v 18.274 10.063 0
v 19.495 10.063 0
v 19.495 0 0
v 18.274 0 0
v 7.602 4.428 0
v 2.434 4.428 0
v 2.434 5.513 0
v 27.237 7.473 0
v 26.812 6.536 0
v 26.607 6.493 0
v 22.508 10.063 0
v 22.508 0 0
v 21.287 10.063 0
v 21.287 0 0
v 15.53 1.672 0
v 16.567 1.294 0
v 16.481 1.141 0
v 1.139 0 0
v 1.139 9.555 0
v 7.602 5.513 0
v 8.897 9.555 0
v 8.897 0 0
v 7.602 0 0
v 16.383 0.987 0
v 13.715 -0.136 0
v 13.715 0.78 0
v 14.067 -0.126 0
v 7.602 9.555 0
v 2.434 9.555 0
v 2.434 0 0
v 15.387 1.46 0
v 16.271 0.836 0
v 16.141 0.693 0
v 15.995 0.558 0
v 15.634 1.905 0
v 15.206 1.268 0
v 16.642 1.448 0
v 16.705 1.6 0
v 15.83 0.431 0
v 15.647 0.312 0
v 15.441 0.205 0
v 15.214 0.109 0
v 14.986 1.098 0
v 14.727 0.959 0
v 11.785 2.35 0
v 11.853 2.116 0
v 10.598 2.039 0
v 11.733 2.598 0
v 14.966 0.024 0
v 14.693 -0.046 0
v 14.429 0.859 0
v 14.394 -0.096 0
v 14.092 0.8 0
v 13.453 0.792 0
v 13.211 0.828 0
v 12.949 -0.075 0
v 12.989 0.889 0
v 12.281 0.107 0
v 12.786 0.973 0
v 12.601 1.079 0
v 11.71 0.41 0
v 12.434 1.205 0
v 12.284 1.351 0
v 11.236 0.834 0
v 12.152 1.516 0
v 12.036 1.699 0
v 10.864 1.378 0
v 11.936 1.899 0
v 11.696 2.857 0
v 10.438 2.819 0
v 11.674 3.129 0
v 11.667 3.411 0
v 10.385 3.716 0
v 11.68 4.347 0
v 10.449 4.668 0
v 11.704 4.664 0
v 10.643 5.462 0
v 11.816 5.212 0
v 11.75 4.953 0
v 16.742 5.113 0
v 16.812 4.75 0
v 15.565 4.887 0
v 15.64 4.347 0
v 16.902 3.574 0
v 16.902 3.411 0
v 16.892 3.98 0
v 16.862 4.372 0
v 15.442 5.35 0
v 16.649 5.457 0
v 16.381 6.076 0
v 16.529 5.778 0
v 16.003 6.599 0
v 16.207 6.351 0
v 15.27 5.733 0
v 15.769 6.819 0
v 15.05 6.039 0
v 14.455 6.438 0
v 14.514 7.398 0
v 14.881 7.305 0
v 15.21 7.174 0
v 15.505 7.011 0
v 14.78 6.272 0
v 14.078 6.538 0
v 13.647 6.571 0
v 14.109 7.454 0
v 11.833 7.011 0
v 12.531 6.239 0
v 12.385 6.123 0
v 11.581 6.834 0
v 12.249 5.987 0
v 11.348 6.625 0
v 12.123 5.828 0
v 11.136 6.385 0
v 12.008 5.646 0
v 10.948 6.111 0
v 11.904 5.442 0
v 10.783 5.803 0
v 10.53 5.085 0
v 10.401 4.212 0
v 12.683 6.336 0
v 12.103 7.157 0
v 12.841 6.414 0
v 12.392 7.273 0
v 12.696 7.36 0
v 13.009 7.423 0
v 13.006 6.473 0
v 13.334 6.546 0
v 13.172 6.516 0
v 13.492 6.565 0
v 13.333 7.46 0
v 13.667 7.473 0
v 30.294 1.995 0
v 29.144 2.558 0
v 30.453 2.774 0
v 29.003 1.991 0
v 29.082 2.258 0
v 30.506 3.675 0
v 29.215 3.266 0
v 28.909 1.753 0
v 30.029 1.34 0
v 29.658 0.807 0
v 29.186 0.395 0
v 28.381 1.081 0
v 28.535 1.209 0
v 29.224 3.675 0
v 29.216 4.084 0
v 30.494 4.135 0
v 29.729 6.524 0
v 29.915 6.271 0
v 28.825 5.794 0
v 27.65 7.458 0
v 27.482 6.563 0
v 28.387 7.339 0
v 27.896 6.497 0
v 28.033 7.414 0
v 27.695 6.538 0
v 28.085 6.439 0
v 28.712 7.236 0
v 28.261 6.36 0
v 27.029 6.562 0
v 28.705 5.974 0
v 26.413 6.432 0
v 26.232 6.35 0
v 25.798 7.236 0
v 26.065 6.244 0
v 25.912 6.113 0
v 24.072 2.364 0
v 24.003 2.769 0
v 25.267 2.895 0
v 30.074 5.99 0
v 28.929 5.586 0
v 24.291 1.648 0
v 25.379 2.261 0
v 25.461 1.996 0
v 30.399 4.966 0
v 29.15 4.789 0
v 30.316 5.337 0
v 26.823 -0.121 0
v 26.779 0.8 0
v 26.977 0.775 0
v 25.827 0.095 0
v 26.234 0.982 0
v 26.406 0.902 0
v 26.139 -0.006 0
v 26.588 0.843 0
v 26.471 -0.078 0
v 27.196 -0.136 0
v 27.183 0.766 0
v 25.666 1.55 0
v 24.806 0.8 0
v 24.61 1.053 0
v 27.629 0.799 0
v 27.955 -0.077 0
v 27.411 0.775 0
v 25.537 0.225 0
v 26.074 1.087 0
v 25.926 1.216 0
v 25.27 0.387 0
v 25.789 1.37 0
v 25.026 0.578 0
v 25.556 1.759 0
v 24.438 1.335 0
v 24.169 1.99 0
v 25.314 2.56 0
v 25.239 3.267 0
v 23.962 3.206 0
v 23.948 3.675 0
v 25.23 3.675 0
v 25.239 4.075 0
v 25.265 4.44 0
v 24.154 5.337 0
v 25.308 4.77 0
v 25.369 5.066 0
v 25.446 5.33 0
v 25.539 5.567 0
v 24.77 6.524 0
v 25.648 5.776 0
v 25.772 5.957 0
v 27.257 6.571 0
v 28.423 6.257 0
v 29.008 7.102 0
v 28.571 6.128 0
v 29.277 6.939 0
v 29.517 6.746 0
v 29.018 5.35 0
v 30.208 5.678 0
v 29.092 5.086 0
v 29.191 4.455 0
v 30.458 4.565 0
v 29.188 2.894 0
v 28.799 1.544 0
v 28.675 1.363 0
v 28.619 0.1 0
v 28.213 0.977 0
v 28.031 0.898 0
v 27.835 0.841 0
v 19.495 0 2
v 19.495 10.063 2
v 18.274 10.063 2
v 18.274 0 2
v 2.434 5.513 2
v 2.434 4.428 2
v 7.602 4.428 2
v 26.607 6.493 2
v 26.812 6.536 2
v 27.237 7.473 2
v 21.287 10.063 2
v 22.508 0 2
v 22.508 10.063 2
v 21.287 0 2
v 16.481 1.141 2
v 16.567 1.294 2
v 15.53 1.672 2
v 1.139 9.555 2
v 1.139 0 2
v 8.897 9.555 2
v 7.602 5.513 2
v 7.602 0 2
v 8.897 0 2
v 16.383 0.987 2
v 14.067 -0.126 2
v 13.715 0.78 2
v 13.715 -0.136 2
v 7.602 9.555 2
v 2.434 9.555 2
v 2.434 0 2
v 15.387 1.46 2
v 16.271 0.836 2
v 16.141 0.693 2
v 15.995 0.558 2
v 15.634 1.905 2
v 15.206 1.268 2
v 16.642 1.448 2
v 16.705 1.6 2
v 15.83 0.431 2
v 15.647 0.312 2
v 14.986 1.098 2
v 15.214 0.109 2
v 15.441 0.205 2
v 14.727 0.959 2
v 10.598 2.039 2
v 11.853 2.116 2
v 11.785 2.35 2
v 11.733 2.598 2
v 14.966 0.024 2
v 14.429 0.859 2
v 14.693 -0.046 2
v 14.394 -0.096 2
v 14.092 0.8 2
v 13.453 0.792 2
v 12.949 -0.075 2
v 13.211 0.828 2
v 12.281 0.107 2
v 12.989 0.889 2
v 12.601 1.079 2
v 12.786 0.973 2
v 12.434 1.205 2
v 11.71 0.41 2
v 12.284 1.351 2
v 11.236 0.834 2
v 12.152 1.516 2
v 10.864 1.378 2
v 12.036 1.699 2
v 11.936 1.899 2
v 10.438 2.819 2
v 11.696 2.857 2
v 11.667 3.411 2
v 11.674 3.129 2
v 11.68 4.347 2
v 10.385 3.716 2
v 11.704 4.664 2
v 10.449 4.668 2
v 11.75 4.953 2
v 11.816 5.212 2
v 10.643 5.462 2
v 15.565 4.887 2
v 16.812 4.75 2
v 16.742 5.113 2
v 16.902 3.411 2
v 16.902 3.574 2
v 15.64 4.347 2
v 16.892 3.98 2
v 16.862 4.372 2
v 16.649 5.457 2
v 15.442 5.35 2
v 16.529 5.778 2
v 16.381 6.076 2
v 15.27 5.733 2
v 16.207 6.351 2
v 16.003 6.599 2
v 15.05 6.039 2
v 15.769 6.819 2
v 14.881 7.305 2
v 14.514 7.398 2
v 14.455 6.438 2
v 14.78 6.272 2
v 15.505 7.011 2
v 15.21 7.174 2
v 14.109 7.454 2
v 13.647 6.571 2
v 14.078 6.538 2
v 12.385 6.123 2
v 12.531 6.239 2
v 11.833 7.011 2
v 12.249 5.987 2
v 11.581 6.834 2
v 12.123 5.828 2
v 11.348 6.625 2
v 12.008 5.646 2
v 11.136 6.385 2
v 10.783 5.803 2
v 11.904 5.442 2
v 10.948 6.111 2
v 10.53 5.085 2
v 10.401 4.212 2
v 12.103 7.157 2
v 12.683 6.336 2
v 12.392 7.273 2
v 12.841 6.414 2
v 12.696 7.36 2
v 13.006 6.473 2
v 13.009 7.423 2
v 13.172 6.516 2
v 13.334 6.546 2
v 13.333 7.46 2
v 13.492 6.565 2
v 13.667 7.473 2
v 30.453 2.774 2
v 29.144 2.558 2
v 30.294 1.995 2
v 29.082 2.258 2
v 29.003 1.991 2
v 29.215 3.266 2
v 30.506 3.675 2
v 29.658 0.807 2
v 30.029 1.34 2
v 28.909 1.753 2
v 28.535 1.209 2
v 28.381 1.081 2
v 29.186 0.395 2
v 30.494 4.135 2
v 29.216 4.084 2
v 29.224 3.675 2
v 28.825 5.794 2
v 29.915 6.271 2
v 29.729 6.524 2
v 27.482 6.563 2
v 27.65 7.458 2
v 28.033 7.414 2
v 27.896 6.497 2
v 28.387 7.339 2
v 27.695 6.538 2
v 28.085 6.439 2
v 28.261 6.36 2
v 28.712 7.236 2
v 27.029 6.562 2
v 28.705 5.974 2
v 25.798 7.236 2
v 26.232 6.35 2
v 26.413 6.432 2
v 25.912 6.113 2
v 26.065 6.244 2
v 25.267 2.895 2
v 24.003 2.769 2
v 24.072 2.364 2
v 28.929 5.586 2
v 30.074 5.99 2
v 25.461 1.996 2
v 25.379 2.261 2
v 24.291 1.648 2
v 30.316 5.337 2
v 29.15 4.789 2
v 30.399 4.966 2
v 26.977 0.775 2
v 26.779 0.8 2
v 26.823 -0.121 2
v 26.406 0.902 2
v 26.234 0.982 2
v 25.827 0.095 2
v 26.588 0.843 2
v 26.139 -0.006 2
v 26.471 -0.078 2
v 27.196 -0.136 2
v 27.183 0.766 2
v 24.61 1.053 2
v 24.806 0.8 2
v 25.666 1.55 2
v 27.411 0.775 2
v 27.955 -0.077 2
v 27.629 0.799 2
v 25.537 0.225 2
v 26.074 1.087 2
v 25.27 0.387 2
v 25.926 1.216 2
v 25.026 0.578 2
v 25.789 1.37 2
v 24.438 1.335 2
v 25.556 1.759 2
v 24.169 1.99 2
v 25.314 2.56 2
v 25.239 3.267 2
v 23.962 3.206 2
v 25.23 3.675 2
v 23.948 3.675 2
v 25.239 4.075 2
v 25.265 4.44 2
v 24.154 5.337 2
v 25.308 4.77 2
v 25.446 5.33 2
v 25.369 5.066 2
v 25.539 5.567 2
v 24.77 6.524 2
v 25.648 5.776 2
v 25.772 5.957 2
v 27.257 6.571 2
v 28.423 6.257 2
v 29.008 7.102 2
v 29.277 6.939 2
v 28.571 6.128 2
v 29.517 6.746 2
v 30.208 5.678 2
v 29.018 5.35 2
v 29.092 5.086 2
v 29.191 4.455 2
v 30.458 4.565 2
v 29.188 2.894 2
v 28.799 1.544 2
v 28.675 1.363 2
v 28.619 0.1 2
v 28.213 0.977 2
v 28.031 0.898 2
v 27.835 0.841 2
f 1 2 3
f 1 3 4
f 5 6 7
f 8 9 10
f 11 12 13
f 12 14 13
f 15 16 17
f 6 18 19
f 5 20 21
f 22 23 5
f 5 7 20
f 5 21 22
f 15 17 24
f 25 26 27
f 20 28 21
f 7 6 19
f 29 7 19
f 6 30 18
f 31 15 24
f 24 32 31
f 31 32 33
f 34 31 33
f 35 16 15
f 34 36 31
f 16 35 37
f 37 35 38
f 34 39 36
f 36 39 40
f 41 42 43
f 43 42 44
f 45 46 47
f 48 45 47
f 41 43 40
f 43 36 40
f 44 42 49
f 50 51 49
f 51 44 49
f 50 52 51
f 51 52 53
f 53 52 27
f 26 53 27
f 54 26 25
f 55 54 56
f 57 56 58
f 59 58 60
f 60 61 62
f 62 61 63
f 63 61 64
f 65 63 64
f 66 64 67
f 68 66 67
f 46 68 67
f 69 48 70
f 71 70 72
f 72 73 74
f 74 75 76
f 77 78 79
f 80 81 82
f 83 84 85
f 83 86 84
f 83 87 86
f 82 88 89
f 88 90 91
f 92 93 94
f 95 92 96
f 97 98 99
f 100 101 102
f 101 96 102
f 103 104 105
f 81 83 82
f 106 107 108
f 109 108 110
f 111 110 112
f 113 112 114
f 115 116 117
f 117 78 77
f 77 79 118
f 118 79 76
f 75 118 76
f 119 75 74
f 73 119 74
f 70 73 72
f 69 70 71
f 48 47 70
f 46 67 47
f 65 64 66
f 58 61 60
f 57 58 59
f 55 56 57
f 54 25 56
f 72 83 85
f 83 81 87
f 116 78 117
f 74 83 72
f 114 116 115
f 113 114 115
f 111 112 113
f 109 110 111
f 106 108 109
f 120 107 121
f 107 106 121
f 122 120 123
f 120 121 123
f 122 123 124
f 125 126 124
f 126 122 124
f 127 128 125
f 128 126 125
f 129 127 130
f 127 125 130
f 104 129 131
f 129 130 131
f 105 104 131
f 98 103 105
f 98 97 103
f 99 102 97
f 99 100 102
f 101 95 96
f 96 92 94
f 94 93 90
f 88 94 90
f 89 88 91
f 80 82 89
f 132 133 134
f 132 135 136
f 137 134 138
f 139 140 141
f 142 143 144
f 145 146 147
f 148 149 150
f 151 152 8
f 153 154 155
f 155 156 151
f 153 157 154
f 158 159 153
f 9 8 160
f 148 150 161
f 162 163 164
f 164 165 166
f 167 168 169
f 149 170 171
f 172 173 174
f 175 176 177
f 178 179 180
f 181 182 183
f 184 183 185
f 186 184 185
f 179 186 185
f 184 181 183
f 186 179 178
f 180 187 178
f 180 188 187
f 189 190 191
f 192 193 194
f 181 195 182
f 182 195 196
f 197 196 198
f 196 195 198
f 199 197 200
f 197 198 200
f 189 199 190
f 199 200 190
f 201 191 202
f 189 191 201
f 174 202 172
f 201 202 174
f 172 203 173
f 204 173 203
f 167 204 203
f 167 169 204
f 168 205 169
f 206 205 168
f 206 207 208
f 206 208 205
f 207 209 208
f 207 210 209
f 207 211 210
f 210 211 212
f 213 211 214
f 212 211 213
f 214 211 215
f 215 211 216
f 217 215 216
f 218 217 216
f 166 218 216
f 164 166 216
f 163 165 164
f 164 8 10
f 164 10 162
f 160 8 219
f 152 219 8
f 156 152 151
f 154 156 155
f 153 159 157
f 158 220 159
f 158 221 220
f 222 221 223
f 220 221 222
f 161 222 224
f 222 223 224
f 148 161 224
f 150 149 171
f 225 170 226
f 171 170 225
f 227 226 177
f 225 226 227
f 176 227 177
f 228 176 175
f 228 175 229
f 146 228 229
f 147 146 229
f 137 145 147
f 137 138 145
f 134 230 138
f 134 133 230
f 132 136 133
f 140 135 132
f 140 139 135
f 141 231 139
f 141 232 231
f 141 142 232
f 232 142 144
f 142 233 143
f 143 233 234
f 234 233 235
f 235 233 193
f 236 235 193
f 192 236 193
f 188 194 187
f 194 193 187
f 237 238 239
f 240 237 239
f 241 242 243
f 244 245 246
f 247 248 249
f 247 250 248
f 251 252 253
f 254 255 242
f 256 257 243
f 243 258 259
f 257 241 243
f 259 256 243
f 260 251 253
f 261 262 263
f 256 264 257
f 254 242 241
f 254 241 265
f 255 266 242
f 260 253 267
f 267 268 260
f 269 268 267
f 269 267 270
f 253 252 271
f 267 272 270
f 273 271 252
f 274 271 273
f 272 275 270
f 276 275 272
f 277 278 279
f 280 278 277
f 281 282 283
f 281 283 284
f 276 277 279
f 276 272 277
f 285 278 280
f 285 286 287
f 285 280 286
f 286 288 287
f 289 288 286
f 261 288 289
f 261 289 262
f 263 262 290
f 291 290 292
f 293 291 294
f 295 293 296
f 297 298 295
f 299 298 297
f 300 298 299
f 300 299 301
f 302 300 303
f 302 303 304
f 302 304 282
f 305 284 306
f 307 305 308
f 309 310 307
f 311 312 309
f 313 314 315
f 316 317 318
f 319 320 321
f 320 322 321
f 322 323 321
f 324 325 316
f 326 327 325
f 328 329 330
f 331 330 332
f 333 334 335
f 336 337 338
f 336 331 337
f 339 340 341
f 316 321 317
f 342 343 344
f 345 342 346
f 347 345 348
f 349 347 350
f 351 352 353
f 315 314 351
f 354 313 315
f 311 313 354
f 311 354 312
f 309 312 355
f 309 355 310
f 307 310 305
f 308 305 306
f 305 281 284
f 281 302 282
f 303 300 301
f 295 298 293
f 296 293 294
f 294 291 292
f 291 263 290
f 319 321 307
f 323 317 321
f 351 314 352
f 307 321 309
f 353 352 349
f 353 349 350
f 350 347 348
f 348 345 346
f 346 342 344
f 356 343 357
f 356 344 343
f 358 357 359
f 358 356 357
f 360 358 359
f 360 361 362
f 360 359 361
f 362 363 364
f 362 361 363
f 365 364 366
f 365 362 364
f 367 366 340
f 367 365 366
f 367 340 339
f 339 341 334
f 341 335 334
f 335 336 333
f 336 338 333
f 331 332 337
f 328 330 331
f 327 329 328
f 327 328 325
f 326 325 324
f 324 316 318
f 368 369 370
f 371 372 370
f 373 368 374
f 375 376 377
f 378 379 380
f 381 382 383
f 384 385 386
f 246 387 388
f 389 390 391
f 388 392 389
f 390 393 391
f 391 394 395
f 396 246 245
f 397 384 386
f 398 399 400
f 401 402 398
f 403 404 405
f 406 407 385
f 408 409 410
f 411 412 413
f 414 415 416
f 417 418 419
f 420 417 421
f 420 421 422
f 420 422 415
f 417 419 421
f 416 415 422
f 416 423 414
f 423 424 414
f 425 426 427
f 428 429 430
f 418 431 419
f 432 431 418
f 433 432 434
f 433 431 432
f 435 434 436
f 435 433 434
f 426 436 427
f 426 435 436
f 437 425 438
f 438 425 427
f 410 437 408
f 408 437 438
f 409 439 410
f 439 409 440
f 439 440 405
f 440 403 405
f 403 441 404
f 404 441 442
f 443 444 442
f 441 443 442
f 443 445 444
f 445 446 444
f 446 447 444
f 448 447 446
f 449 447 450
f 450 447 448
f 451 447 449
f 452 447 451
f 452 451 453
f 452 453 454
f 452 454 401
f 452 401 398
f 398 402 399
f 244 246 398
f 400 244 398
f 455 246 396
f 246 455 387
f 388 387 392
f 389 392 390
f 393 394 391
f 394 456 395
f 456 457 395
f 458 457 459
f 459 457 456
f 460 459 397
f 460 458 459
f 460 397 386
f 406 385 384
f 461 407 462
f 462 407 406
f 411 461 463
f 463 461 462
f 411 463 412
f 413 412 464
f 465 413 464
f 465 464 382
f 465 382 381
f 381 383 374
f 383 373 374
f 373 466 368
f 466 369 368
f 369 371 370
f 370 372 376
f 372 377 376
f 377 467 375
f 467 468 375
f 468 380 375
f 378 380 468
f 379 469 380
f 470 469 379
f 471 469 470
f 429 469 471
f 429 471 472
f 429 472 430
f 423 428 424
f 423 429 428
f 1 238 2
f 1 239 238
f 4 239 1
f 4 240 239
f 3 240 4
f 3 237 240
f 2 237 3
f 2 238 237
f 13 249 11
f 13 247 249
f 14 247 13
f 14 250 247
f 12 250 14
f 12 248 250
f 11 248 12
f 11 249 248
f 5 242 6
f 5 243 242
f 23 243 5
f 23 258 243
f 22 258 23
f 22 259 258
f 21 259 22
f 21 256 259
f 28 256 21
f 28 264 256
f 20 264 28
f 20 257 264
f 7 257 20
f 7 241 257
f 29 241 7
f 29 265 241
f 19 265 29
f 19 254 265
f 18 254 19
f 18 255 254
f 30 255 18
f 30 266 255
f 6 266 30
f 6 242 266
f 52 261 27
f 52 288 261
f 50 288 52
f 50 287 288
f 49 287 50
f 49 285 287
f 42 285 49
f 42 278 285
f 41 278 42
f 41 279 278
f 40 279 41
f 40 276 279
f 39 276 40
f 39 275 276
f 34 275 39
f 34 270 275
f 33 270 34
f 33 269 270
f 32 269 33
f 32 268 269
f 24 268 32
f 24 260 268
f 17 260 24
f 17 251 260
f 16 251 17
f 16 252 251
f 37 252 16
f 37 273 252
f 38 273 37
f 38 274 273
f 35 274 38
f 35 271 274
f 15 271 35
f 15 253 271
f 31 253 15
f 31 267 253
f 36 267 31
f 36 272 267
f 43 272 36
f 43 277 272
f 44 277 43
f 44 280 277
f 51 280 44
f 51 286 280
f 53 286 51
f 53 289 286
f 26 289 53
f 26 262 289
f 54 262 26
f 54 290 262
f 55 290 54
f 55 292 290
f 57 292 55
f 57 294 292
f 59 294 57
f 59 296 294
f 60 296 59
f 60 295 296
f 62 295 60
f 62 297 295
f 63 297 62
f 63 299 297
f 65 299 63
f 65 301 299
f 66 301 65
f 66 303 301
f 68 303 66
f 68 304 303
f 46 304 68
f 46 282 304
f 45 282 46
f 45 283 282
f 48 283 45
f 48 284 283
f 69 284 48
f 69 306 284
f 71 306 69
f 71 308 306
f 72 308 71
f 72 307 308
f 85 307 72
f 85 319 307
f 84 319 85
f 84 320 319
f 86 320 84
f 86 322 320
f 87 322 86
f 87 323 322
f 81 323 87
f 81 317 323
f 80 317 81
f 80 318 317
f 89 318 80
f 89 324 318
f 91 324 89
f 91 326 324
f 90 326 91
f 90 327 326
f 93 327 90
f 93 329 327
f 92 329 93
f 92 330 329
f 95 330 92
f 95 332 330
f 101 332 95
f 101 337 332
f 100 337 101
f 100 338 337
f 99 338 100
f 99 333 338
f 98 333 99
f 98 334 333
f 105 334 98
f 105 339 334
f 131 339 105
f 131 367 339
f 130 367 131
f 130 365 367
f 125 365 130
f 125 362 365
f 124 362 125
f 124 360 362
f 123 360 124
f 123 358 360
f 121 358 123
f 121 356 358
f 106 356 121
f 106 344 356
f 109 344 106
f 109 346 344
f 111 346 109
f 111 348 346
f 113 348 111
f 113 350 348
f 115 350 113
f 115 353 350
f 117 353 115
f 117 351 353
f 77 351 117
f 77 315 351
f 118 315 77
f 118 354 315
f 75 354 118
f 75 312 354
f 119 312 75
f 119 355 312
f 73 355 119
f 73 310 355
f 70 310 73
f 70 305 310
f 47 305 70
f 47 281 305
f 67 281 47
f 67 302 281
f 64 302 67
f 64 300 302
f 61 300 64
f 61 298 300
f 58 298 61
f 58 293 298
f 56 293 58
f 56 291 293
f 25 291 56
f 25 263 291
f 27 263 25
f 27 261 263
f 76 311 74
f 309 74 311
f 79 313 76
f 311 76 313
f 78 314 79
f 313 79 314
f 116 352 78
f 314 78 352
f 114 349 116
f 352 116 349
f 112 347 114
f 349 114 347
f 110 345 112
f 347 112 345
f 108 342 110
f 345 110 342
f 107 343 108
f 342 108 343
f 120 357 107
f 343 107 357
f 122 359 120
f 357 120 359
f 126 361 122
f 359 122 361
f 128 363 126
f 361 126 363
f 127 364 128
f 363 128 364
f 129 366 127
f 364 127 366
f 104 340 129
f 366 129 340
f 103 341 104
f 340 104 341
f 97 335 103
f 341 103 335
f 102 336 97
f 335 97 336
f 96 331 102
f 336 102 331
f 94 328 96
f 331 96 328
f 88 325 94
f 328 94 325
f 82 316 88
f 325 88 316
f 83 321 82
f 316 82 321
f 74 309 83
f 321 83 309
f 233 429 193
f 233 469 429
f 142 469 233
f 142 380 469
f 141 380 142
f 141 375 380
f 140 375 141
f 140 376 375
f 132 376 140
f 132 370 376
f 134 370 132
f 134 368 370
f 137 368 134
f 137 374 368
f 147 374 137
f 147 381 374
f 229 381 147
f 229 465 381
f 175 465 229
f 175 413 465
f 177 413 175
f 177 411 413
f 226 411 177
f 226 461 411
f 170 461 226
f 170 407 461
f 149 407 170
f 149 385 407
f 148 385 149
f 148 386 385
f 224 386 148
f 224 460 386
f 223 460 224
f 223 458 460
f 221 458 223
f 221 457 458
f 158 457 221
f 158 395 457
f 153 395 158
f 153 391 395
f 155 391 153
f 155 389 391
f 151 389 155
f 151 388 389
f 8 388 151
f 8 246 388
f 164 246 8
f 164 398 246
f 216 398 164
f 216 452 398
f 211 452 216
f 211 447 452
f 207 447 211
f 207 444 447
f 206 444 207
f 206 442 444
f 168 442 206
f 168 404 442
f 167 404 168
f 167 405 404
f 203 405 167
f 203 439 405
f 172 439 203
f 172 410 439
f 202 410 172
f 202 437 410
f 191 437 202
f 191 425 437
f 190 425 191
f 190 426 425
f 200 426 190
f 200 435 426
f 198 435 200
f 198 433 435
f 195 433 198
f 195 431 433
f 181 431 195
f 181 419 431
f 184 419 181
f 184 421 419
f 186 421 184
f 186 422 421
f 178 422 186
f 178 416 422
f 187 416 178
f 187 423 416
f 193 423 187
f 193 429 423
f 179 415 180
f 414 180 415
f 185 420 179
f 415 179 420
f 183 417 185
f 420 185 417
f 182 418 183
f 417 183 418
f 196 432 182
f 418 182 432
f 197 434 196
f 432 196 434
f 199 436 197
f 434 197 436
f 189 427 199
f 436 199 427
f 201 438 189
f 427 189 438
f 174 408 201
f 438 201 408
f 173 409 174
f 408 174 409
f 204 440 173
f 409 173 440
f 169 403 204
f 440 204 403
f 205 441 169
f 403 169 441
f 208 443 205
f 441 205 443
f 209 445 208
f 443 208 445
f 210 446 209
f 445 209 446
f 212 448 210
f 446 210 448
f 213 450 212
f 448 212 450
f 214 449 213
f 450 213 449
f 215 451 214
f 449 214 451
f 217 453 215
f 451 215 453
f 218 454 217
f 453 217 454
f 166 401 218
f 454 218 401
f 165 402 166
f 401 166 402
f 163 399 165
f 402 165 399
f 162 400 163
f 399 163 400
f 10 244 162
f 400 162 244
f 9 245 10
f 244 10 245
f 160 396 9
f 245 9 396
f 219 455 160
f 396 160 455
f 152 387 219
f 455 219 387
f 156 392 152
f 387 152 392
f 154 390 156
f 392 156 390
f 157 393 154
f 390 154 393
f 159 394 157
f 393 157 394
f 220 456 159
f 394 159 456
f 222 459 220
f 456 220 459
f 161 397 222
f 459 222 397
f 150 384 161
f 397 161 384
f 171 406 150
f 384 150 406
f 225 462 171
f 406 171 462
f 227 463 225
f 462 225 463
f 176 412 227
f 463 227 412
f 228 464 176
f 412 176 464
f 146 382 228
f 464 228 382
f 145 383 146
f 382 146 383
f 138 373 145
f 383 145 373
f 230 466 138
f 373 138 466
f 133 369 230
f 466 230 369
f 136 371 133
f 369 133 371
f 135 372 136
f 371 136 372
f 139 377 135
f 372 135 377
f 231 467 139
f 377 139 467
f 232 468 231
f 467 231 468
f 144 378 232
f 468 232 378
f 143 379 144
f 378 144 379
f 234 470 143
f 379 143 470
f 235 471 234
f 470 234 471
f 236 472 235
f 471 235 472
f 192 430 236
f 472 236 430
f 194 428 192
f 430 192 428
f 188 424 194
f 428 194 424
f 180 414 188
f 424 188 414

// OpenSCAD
// Basic text test - Hershey default font
linear_extrude(height = 2)
  text("Hello", size = 10);
